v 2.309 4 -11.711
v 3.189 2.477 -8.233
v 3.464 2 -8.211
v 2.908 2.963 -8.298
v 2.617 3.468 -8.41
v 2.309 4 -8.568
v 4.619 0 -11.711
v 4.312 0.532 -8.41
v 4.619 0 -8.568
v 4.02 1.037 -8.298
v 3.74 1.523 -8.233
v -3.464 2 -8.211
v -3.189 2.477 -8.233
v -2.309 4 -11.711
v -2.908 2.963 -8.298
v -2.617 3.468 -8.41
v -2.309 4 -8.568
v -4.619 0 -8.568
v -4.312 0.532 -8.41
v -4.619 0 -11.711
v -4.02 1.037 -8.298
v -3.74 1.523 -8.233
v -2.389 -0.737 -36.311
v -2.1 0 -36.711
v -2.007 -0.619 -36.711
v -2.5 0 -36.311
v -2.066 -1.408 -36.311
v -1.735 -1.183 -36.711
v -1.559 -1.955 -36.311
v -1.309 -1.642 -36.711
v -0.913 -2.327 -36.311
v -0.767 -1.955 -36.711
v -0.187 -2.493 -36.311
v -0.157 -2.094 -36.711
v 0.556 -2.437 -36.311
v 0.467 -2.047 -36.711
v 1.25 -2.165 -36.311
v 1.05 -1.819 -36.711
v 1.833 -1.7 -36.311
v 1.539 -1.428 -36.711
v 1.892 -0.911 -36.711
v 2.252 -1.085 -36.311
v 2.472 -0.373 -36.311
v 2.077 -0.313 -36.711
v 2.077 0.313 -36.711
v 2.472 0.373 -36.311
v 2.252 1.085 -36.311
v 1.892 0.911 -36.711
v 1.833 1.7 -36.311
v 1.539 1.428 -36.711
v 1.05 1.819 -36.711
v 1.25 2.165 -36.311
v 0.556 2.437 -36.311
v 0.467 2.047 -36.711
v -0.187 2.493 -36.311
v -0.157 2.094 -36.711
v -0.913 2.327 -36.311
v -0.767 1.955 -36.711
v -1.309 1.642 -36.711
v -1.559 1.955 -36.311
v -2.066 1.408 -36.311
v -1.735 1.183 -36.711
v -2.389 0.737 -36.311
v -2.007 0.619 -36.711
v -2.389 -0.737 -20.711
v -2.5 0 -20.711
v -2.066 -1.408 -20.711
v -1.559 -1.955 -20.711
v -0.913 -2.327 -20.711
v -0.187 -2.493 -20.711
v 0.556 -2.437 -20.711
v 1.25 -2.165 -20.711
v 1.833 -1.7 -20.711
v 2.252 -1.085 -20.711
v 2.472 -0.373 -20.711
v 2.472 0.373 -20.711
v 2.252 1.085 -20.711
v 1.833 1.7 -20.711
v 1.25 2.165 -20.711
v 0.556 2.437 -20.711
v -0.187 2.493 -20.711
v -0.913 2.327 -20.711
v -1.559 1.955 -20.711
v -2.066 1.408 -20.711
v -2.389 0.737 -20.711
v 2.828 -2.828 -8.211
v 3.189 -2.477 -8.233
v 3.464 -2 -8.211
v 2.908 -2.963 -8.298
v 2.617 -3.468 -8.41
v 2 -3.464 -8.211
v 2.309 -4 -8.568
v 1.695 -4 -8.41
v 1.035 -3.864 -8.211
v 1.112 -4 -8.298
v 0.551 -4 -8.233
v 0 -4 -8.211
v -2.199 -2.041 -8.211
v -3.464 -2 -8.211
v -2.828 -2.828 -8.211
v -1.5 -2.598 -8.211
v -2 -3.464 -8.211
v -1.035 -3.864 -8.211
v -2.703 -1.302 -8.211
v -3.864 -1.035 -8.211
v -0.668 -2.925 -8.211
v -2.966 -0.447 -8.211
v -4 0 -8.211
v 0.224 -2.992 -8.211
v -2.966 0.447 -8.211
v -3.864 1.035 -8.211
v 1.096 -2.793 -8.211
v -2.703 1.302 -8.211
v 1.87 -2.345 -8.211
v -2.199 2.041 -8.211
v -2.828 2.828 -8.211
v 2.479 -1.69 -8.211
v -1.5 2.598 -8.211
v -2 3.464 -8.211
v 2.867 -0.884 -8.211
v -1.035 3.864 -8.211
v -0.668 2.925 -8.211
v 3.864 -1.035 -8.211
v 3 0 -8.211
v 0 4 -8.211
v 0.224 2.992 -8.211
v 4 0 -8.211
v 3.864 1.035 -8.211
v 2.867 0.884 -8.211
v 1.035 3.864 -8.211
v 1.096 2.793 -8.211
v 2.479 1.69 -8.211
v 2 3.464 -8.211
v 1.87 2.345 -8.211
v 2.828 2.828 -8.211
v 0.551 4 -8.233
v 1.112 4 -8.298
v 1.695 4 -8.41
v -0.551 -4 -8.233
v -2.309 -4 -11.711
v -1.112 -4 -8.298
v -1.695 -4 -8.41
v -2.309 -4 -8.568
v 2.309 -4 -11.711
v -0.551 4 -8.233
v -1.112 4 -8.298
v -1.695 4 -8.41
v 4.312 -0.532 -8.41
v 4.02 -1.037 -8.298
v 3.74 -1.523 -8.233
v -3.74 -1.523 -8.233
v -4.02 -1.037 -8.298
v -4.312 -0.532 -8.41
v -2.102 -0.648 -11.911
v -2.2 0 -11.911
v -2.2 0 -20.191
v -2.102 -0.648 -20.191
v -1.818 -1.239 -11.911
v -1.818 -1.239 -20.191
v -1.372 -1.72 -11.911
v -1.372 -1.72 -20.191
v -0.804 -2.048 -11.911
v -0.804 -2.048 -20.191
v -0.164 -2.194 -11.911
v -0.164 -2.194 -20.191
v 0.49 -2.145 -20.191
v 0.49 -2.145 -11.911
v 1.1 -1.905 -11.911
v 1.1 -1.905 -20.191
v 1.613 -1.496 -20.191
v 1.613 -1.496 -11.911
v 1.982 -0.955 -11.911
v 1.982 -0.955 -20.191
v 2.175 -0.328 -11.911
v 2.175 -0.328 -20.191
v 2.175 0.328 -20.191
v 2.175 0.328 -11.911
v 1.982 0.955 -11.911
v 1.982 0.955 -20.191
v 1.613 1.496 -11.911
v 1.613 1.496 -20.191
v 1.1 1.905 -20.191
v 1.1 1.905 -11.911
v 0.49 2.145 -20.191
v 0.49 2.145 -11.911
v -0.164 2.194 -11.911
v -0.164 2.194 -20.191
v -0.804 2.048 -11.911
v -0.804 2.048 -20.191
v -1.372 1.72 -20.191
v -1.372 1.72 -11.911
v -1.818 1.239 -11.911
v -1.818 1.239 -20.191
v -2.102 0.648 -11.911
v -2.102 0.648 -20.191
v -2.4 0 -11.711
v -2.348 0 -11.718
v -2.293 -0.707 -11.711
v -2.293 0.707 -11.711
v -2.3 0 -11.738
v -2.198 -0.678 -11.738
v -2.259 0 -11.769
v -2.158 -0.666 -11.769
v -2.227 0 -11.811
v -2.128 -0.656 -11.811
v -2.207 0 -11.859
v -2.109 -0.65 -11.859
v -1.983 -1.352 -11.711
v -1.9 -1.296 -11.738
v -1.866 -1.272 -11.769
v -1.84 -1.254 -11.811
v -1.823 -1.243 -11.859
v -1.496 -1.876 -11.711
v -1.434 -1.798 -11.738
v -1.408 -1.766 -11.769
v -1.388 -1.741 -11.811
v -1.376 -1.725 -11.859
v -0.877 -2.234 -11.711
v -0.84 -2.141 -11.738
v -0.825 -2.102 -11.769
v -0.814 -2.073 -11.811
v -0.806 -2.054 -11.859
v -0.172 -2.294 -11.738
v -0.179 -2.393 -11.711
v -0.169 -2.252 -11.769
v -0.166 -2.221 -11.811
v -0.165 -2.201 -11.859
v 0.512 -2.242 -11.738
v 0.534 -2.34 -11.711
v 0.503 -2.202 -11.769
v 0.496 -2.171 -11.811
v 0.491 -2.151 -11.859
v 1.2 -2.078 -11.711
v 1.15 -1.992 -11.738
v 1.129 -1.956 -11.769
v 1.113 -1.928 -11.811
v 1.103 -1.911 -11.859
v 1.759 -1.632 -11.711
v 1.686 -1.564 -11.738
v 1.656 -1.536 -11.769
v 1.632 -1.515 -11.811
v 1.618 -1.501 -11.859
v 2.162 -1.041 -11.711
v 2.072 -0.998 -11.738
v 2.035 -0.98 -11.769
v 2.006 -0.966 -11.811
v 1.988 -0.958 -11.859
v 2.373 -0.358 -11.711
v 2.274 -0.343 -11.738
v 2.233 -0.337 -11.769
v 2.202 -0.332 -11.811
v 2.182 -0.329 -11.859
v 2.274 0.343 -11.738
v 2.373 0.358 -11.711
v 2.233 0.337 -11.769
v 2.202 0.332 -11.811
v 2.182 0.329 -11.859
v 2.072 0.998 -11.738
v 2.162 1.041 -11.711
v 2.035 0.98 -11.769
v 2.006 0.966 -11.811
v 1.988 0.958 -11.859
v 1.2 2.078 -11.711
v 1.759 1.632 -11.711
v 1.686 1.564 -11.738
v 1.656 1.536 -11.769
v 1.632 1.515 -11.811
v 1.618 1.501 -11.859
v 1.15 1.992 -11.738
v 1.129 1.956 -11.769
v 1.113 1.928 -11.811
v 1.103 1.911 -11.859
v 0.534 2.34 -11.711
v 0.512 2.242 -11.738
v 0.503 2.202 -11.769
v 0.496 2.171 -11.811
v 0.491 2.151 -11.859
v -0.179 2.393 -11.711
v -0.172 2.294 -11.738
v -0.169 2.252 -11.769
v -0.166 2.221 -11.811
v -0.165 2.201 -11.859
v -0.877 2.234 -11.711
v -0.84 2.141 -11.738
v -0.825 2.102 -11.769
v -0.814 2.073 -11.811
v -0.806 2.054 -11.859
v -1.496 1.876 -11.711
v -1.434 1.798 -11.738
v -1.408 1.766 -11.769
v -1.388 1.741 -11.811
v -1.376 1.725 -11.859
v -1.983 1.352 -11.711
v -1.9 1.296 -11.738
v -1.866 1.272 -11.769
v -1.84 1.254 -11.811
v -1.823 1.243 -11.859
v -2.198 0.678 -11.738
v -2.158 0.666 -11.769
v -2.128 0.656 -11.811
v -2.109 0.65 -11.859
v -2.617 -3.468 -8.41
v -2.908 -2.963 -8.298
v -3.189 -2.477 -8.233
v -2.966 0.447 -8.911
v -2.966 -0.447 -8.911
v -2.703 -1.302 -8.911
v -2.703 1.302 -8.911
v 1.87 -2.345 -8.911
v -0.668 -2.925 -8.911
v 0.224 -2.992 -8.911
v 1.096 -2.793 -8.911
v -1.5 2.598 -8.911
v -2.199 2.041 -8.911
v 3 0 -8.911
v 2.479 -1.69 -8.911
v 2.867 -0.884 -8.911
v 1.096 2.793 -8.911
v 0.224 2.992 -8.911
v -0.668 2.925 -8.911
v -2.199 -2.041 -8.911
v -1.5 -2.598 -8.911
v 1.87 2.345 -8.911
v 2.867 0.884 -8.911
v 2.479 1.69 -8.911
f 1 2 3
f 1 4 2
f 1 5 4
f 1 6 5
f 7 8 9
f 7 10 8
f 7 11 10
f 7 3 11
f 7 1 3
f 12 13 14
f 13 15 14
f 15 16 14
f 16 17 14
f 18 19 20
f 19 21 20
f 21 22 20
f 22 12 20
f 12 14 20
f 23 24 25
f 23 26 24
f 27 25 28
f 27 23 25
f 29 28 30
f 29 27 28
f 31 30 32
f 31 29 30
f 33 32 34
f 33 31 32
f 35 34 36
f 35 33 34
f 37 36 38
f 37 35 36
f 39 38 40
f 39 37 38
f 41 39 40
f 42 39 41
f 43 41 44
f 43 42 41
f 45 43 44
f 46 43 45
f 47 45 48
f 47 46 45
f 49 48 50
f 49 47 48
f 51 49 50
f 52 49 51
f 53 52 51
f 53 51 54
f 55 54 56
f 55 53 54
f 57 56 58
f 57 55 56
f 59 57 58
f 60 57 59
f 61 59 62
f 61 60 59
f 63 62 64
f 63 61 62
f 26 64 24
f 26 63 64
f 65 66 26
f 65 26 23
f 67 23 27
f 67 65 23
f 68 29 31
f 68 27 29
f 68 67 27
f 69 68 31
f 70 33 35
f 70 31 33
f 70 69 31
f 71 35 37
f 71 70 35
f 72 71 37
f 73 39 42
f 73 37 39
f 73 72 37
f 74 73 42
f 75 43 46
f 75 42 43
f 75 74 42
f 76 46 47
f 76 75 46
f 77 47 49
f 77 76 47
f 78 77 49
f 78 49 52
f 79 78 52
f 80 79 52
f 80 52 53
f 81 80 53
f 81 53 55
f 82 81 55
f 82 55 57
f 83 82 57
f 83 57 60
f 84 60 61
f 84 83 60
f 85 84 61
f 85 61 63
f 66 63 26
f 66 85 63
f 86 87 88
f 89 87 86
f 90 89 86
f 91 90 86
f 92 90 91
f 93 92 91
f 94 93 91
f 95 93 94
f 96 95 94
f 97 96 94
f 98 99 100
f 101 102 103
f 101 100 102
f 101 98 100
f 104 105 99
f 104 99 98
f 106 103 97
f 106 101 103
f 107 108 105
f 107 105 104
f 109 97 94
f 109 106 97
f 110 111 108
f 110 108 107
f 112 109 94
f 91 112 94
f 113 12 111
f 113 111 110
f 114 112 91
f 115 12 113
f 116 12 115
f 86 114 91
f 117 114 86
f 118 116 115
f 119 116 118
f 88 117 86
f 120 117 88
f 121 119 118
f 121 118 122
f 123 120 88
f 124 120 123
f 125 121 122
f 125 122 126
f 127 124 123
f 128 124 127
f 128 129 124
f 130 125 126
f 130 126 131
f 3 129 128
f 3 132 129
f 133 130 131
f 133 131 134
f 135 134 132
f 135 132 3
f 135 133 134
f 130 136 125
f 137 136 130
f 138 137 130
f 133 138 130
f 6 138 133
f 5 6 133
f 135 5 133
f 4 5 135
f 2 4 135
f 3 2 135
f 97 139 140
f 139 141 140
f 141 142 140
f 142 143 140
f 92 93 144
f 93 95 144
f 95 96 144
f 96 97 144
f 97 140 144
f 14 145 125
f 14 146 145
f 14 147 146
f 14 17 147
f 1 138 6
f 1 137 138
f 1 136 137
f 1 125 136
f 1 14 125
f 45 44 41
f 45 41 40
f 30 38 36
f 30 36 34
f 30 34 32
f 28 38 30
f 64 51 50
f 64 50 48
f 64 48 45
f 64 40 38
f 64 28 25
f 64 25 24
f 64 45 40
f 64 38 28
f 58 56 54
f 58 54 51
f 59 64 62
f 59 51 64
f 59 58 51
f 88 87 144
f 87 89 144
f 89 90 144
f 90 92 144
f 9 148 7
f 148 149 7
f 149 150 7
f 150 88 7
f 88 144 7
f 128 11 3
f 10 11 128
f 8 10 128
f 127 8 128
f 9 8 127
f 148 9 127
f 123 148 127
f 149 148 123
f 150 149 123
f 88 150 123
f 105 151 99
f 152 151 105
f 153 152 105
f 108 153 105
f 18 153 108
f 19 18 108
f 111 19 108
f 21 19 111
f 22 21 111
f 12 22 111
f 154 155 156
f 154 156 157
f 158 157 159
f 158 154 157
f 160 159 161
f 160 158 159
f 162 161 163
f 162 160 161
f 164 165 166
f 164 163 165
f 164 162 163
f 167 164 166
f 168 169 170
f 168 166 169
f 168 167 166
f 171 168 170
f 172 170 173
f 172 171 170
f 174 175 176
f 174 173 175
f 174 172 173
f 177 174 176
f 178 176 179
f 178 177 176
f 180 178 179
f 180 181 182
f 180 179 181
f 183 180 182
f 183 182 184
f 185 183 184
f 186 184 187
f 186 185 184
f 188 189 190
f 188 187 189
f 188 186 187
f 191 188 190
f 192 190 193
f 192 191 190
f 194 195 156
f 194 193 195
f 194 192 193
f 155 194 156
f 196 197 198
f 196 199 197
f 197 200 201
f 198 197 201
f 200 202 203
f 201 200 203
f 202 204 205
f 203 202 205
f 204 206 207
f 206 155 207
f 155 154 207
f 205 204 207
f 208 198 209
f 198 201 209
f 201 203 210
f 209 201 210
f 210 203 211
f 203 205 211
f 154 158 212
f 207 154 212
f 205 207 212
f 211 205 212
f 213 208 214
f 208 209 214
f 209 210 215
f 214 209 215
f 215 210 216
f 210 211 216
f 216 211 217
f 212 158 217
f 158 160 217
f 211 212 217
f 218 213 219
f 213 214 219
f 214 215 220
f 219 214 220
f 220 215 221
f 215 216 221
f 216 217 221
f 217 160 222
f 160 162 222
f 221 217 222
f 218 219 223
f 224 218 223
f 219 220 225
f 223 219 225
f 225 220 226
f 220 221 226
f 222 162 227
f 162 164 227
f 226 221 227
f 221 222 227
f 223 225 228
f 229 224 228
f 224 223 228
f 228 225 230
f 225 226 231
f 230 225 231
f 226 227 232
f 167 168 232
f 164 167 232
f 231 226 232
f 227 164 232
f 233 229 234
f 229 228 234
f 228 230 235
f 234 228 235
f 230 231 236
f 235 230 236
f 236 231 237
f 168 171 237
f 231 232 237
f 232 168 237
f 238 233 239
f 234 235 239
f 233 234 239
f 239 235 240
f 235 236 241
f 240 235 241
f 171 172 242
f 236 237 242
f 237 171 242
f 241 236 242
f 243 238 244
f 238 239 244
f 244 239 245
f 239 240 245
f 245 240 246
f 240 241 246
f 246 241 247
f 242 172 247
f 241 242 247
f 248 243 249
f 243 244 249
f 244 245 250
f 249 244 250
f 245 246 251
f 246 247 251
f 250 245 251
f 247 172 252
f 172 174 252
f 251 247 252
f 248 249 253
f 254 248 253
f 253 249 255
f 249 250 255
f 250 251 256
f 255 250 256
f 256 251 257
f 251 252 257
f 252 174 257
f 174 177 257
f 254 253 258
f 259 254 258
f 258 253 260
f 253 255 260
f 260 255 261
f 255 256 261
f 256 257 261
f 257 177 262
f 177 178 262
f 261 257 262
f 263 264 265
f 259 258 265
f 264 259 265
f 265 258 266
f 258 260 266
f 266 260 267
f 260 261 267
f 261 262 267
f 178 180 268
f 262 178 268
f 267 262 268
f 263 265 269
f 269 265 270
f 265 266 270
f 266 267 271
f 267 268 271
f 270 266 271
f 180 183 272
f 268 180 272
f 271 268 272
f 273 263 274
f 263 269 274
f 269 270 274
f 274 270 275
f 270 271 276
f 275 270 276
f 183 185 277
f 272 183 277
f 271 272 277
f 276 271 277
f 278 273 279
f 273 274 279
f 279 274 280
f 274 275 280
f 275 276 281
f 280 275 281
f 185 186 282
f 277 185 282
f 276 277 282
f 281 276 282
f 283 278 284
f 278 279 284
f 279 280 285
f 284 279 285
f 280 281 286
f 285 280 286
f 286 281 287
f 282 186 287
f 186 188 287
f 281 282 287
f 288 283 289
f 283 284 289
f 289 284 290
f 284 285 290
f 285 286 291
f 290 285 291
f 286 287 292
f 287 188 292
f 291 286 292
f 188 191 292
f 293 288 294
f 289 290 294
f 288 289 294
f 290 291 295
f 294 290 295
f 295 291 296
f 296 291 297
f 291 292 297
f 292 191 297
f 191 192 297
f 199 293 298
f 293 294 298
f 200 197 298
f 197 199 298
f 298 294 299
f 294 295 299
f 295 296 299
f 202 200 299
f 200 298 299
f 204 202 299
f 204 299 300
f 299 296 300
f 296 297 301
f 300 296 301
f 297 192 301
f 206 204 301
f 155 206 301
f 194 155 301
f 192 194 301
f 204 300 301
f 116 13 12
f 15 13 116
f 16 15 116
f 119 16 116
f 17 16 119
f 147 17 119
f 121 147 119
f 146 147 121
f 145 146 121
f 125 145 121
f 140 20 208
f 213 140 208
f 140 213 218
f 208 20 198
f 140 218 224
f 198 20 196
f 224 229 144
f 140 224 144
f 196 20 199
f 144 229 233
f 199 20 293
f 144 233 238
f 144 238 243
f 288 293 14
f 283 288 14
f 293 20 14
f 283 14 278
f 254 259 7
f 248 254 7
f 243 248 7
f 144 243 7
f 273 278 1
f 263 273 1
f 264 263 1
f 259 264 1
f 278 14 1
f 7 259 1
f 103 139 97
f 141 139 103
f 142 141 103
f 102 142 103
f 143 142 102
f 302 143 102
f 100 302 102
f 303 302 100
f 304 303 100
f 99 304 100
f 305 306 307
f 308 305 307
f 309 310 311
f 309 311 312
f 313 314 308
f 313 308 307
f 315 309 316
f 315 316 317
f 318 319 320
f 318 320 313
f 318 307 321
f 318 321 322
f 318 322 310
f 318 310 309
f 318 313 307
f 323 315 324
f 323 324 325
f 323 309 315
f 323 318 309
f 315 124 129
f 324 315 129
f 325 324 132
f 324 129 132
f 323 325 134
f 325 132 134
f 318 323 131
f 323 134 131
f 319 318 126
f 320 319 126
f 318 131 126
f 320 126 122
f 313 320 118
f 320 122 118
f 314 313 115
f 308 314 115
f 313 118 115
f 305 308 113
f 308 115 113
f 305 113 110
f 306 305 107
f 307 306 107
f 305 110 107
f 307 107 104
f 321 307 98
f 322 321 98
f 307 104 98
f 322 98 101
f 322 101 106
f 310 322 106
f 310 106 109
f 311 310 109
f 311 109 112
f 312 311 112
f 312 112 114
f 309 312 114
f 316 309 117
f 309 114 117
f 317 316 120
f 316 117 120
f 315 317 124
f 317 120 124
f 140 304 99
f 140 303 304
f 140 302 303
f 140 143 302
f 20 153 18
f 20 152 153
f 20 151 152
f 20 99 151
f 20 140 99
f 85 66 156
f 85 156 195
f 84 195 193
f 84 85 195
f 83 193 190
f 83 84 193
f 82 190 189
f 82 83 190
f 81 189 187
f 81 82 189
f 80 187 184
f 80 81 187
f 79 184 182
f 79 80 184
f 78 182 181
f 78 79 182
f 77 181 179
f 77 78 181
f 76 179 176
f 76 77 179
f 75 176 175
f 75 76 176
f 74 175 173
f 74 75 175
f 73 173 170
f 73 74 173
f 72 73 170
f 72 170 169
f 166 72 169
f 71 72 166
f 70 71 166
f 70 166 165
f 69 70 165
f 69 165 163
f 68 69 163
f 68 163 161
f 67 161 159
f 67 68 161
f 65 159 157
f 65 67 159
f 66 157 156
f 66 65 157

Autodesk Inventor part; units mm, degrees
ref_plane "YZ Plane" through (0, 0, 0) normal (1, 0, 0) x (0, 1, 0)
sketch "Sketch2" plane through (0, 0, 0) normal (0, 1, 0) x (-1, 0, 0)
  line L0 (0, -11.7108) -> (0, -36.7108)
  line L1 (0, -36.7108) -> (2.1, -36.7108)
  line L2 (2.5, -36.3108) -> (2.5, -20.7108)
  line L3 (2.5, -20.7108) -> (2.2, -20.1912)
  line L4 (2.2, -20.1912) -> (2.2, -11.7108)
  line L5 (2.2, -11.7108) -> (0, -11.7108)
  line L6 (2.1, -36.7108) -> (2.5, -36.3108)
  line L7 (2.5, -36.7108) -> (2.5, -37.2765)
  line L8 (0, -42.3897) -> (0, -6.5977) projected
  dimension "Ds" = 4.4
  dimension "NND" = 5
  dimension "b" = 16
  dimension "d3" = 30
  dimension "d5" = 45
  dimension "PTC" = 0.8
  dimension "NLG" = 25
revolve "Revolution1" add sketch "Sketch2" angle 360 about axis through (0, 0, -11.7108) along (0, 0, -1)
sketch "Sketch3" plane through (0, 0, -11.7108) normal (0, 0, 1) x (1, 0, 0)
  circle A0 centre (0, 0) radius 2.2 projected
  line L0 (0, 4) -> (2.3094, 4)
  line L1 (2.3094, 4) -> (4.6188, 0)
  line L2 (4.6188, 0) -> (0, 0)
  line L3 (0, 0) -> (0, 4)
  line L4 (0, 4) -> (-2.3094, 4)
  line L5 (-2.3094, 4) -> (-4.6188, 0)
  line L6 (0, -4) -> (2.3094, -4)
  line L7 (2.3094, -4) -> (4.6188, 0)
  line L8 (-2.3094, -4) -> (-4.6188, 0)
  line L9 (0, -4) -> (-2.3094, -4)
  dimension "d9" = 60
  dimension "ParS" = 8
  dimension "msp_d11" = 8
extrude "Extrusion1" add sketch "Sketch3" along normal blind 3.5
sketch "Sketch4" plane through (0, 0, 0) normal (0, 1, 0) x (-1, 0, 0)
  line L0 (-4, -8.2108) -> (-4.6188, -8.2108)
  line L1 (-4.6188, -8.2108) -> (-4.6188, -8.5681)
  line L2 (-4.6188, -8.5681) -> (-4, -8.2108)
  line L3 (0, -19.5602) -> (0, 35.3854) projected
  line L4 (0, 27.536) -> (0, 27.1787)
  line L5 (-4.6188, -11.7108) -> (-4.6188, -8.2108) projected
  line L6 (-2.3094, -8.2108) -> (-4.6188, -8.2108) projected
  dimension "d14" = 30
  dimension "msp_d15" = 8
revolve "Revolution2" cut sketch "Sketch4" angle 360 about axis through (0, 0, 27.536) along (0, 0, -1)
sketch "Sketch5" plane through (0, 0, -8.2108) normal (0, 0, 1) x (1, 0, 0)
  arc A0 (3.4641, 2) -> (0, 4) centre (0, 0) ccw projected
  circle A1 centre (0, 0) radius 3
  dimension "d27" = 6
extrude "Extrusion2" cut sketch "Sketch5" against normal blind 0.7
thread "Thread1" size "M5x0.8" class "6g" standard "ISO Metric profile" full length
ref_plane "MSC_PF1" through (0, 0, 0) normal (0, 1, 0) x (-1, 0, 0)
ref_plane "MSC_PT1" through (0, 0, -11.7108) normal (0, 0, -1) x (-1, 0, 0)
fillet "Fillet1" radius 0.2 1 edges at (2.2, 0, -11.7108)
equation "\"msp_d11\" = ParS"
equation "\"msp_d15\" = ParS"
equation "\"d27\" = 0.75 * ParS"
equation "\"d28\" = 0.2 * ParK"
equation "\"d30\" = r"
equation "\"msp_d17\" = b"
equation "\"r\" = 0.2"
equation "\"THREADDIA\" = NND"
equation "\"ParK\" = 3.5"
properties part number "ISO 4015 - M5 x 25" material "Stainless Steel, 440C"
